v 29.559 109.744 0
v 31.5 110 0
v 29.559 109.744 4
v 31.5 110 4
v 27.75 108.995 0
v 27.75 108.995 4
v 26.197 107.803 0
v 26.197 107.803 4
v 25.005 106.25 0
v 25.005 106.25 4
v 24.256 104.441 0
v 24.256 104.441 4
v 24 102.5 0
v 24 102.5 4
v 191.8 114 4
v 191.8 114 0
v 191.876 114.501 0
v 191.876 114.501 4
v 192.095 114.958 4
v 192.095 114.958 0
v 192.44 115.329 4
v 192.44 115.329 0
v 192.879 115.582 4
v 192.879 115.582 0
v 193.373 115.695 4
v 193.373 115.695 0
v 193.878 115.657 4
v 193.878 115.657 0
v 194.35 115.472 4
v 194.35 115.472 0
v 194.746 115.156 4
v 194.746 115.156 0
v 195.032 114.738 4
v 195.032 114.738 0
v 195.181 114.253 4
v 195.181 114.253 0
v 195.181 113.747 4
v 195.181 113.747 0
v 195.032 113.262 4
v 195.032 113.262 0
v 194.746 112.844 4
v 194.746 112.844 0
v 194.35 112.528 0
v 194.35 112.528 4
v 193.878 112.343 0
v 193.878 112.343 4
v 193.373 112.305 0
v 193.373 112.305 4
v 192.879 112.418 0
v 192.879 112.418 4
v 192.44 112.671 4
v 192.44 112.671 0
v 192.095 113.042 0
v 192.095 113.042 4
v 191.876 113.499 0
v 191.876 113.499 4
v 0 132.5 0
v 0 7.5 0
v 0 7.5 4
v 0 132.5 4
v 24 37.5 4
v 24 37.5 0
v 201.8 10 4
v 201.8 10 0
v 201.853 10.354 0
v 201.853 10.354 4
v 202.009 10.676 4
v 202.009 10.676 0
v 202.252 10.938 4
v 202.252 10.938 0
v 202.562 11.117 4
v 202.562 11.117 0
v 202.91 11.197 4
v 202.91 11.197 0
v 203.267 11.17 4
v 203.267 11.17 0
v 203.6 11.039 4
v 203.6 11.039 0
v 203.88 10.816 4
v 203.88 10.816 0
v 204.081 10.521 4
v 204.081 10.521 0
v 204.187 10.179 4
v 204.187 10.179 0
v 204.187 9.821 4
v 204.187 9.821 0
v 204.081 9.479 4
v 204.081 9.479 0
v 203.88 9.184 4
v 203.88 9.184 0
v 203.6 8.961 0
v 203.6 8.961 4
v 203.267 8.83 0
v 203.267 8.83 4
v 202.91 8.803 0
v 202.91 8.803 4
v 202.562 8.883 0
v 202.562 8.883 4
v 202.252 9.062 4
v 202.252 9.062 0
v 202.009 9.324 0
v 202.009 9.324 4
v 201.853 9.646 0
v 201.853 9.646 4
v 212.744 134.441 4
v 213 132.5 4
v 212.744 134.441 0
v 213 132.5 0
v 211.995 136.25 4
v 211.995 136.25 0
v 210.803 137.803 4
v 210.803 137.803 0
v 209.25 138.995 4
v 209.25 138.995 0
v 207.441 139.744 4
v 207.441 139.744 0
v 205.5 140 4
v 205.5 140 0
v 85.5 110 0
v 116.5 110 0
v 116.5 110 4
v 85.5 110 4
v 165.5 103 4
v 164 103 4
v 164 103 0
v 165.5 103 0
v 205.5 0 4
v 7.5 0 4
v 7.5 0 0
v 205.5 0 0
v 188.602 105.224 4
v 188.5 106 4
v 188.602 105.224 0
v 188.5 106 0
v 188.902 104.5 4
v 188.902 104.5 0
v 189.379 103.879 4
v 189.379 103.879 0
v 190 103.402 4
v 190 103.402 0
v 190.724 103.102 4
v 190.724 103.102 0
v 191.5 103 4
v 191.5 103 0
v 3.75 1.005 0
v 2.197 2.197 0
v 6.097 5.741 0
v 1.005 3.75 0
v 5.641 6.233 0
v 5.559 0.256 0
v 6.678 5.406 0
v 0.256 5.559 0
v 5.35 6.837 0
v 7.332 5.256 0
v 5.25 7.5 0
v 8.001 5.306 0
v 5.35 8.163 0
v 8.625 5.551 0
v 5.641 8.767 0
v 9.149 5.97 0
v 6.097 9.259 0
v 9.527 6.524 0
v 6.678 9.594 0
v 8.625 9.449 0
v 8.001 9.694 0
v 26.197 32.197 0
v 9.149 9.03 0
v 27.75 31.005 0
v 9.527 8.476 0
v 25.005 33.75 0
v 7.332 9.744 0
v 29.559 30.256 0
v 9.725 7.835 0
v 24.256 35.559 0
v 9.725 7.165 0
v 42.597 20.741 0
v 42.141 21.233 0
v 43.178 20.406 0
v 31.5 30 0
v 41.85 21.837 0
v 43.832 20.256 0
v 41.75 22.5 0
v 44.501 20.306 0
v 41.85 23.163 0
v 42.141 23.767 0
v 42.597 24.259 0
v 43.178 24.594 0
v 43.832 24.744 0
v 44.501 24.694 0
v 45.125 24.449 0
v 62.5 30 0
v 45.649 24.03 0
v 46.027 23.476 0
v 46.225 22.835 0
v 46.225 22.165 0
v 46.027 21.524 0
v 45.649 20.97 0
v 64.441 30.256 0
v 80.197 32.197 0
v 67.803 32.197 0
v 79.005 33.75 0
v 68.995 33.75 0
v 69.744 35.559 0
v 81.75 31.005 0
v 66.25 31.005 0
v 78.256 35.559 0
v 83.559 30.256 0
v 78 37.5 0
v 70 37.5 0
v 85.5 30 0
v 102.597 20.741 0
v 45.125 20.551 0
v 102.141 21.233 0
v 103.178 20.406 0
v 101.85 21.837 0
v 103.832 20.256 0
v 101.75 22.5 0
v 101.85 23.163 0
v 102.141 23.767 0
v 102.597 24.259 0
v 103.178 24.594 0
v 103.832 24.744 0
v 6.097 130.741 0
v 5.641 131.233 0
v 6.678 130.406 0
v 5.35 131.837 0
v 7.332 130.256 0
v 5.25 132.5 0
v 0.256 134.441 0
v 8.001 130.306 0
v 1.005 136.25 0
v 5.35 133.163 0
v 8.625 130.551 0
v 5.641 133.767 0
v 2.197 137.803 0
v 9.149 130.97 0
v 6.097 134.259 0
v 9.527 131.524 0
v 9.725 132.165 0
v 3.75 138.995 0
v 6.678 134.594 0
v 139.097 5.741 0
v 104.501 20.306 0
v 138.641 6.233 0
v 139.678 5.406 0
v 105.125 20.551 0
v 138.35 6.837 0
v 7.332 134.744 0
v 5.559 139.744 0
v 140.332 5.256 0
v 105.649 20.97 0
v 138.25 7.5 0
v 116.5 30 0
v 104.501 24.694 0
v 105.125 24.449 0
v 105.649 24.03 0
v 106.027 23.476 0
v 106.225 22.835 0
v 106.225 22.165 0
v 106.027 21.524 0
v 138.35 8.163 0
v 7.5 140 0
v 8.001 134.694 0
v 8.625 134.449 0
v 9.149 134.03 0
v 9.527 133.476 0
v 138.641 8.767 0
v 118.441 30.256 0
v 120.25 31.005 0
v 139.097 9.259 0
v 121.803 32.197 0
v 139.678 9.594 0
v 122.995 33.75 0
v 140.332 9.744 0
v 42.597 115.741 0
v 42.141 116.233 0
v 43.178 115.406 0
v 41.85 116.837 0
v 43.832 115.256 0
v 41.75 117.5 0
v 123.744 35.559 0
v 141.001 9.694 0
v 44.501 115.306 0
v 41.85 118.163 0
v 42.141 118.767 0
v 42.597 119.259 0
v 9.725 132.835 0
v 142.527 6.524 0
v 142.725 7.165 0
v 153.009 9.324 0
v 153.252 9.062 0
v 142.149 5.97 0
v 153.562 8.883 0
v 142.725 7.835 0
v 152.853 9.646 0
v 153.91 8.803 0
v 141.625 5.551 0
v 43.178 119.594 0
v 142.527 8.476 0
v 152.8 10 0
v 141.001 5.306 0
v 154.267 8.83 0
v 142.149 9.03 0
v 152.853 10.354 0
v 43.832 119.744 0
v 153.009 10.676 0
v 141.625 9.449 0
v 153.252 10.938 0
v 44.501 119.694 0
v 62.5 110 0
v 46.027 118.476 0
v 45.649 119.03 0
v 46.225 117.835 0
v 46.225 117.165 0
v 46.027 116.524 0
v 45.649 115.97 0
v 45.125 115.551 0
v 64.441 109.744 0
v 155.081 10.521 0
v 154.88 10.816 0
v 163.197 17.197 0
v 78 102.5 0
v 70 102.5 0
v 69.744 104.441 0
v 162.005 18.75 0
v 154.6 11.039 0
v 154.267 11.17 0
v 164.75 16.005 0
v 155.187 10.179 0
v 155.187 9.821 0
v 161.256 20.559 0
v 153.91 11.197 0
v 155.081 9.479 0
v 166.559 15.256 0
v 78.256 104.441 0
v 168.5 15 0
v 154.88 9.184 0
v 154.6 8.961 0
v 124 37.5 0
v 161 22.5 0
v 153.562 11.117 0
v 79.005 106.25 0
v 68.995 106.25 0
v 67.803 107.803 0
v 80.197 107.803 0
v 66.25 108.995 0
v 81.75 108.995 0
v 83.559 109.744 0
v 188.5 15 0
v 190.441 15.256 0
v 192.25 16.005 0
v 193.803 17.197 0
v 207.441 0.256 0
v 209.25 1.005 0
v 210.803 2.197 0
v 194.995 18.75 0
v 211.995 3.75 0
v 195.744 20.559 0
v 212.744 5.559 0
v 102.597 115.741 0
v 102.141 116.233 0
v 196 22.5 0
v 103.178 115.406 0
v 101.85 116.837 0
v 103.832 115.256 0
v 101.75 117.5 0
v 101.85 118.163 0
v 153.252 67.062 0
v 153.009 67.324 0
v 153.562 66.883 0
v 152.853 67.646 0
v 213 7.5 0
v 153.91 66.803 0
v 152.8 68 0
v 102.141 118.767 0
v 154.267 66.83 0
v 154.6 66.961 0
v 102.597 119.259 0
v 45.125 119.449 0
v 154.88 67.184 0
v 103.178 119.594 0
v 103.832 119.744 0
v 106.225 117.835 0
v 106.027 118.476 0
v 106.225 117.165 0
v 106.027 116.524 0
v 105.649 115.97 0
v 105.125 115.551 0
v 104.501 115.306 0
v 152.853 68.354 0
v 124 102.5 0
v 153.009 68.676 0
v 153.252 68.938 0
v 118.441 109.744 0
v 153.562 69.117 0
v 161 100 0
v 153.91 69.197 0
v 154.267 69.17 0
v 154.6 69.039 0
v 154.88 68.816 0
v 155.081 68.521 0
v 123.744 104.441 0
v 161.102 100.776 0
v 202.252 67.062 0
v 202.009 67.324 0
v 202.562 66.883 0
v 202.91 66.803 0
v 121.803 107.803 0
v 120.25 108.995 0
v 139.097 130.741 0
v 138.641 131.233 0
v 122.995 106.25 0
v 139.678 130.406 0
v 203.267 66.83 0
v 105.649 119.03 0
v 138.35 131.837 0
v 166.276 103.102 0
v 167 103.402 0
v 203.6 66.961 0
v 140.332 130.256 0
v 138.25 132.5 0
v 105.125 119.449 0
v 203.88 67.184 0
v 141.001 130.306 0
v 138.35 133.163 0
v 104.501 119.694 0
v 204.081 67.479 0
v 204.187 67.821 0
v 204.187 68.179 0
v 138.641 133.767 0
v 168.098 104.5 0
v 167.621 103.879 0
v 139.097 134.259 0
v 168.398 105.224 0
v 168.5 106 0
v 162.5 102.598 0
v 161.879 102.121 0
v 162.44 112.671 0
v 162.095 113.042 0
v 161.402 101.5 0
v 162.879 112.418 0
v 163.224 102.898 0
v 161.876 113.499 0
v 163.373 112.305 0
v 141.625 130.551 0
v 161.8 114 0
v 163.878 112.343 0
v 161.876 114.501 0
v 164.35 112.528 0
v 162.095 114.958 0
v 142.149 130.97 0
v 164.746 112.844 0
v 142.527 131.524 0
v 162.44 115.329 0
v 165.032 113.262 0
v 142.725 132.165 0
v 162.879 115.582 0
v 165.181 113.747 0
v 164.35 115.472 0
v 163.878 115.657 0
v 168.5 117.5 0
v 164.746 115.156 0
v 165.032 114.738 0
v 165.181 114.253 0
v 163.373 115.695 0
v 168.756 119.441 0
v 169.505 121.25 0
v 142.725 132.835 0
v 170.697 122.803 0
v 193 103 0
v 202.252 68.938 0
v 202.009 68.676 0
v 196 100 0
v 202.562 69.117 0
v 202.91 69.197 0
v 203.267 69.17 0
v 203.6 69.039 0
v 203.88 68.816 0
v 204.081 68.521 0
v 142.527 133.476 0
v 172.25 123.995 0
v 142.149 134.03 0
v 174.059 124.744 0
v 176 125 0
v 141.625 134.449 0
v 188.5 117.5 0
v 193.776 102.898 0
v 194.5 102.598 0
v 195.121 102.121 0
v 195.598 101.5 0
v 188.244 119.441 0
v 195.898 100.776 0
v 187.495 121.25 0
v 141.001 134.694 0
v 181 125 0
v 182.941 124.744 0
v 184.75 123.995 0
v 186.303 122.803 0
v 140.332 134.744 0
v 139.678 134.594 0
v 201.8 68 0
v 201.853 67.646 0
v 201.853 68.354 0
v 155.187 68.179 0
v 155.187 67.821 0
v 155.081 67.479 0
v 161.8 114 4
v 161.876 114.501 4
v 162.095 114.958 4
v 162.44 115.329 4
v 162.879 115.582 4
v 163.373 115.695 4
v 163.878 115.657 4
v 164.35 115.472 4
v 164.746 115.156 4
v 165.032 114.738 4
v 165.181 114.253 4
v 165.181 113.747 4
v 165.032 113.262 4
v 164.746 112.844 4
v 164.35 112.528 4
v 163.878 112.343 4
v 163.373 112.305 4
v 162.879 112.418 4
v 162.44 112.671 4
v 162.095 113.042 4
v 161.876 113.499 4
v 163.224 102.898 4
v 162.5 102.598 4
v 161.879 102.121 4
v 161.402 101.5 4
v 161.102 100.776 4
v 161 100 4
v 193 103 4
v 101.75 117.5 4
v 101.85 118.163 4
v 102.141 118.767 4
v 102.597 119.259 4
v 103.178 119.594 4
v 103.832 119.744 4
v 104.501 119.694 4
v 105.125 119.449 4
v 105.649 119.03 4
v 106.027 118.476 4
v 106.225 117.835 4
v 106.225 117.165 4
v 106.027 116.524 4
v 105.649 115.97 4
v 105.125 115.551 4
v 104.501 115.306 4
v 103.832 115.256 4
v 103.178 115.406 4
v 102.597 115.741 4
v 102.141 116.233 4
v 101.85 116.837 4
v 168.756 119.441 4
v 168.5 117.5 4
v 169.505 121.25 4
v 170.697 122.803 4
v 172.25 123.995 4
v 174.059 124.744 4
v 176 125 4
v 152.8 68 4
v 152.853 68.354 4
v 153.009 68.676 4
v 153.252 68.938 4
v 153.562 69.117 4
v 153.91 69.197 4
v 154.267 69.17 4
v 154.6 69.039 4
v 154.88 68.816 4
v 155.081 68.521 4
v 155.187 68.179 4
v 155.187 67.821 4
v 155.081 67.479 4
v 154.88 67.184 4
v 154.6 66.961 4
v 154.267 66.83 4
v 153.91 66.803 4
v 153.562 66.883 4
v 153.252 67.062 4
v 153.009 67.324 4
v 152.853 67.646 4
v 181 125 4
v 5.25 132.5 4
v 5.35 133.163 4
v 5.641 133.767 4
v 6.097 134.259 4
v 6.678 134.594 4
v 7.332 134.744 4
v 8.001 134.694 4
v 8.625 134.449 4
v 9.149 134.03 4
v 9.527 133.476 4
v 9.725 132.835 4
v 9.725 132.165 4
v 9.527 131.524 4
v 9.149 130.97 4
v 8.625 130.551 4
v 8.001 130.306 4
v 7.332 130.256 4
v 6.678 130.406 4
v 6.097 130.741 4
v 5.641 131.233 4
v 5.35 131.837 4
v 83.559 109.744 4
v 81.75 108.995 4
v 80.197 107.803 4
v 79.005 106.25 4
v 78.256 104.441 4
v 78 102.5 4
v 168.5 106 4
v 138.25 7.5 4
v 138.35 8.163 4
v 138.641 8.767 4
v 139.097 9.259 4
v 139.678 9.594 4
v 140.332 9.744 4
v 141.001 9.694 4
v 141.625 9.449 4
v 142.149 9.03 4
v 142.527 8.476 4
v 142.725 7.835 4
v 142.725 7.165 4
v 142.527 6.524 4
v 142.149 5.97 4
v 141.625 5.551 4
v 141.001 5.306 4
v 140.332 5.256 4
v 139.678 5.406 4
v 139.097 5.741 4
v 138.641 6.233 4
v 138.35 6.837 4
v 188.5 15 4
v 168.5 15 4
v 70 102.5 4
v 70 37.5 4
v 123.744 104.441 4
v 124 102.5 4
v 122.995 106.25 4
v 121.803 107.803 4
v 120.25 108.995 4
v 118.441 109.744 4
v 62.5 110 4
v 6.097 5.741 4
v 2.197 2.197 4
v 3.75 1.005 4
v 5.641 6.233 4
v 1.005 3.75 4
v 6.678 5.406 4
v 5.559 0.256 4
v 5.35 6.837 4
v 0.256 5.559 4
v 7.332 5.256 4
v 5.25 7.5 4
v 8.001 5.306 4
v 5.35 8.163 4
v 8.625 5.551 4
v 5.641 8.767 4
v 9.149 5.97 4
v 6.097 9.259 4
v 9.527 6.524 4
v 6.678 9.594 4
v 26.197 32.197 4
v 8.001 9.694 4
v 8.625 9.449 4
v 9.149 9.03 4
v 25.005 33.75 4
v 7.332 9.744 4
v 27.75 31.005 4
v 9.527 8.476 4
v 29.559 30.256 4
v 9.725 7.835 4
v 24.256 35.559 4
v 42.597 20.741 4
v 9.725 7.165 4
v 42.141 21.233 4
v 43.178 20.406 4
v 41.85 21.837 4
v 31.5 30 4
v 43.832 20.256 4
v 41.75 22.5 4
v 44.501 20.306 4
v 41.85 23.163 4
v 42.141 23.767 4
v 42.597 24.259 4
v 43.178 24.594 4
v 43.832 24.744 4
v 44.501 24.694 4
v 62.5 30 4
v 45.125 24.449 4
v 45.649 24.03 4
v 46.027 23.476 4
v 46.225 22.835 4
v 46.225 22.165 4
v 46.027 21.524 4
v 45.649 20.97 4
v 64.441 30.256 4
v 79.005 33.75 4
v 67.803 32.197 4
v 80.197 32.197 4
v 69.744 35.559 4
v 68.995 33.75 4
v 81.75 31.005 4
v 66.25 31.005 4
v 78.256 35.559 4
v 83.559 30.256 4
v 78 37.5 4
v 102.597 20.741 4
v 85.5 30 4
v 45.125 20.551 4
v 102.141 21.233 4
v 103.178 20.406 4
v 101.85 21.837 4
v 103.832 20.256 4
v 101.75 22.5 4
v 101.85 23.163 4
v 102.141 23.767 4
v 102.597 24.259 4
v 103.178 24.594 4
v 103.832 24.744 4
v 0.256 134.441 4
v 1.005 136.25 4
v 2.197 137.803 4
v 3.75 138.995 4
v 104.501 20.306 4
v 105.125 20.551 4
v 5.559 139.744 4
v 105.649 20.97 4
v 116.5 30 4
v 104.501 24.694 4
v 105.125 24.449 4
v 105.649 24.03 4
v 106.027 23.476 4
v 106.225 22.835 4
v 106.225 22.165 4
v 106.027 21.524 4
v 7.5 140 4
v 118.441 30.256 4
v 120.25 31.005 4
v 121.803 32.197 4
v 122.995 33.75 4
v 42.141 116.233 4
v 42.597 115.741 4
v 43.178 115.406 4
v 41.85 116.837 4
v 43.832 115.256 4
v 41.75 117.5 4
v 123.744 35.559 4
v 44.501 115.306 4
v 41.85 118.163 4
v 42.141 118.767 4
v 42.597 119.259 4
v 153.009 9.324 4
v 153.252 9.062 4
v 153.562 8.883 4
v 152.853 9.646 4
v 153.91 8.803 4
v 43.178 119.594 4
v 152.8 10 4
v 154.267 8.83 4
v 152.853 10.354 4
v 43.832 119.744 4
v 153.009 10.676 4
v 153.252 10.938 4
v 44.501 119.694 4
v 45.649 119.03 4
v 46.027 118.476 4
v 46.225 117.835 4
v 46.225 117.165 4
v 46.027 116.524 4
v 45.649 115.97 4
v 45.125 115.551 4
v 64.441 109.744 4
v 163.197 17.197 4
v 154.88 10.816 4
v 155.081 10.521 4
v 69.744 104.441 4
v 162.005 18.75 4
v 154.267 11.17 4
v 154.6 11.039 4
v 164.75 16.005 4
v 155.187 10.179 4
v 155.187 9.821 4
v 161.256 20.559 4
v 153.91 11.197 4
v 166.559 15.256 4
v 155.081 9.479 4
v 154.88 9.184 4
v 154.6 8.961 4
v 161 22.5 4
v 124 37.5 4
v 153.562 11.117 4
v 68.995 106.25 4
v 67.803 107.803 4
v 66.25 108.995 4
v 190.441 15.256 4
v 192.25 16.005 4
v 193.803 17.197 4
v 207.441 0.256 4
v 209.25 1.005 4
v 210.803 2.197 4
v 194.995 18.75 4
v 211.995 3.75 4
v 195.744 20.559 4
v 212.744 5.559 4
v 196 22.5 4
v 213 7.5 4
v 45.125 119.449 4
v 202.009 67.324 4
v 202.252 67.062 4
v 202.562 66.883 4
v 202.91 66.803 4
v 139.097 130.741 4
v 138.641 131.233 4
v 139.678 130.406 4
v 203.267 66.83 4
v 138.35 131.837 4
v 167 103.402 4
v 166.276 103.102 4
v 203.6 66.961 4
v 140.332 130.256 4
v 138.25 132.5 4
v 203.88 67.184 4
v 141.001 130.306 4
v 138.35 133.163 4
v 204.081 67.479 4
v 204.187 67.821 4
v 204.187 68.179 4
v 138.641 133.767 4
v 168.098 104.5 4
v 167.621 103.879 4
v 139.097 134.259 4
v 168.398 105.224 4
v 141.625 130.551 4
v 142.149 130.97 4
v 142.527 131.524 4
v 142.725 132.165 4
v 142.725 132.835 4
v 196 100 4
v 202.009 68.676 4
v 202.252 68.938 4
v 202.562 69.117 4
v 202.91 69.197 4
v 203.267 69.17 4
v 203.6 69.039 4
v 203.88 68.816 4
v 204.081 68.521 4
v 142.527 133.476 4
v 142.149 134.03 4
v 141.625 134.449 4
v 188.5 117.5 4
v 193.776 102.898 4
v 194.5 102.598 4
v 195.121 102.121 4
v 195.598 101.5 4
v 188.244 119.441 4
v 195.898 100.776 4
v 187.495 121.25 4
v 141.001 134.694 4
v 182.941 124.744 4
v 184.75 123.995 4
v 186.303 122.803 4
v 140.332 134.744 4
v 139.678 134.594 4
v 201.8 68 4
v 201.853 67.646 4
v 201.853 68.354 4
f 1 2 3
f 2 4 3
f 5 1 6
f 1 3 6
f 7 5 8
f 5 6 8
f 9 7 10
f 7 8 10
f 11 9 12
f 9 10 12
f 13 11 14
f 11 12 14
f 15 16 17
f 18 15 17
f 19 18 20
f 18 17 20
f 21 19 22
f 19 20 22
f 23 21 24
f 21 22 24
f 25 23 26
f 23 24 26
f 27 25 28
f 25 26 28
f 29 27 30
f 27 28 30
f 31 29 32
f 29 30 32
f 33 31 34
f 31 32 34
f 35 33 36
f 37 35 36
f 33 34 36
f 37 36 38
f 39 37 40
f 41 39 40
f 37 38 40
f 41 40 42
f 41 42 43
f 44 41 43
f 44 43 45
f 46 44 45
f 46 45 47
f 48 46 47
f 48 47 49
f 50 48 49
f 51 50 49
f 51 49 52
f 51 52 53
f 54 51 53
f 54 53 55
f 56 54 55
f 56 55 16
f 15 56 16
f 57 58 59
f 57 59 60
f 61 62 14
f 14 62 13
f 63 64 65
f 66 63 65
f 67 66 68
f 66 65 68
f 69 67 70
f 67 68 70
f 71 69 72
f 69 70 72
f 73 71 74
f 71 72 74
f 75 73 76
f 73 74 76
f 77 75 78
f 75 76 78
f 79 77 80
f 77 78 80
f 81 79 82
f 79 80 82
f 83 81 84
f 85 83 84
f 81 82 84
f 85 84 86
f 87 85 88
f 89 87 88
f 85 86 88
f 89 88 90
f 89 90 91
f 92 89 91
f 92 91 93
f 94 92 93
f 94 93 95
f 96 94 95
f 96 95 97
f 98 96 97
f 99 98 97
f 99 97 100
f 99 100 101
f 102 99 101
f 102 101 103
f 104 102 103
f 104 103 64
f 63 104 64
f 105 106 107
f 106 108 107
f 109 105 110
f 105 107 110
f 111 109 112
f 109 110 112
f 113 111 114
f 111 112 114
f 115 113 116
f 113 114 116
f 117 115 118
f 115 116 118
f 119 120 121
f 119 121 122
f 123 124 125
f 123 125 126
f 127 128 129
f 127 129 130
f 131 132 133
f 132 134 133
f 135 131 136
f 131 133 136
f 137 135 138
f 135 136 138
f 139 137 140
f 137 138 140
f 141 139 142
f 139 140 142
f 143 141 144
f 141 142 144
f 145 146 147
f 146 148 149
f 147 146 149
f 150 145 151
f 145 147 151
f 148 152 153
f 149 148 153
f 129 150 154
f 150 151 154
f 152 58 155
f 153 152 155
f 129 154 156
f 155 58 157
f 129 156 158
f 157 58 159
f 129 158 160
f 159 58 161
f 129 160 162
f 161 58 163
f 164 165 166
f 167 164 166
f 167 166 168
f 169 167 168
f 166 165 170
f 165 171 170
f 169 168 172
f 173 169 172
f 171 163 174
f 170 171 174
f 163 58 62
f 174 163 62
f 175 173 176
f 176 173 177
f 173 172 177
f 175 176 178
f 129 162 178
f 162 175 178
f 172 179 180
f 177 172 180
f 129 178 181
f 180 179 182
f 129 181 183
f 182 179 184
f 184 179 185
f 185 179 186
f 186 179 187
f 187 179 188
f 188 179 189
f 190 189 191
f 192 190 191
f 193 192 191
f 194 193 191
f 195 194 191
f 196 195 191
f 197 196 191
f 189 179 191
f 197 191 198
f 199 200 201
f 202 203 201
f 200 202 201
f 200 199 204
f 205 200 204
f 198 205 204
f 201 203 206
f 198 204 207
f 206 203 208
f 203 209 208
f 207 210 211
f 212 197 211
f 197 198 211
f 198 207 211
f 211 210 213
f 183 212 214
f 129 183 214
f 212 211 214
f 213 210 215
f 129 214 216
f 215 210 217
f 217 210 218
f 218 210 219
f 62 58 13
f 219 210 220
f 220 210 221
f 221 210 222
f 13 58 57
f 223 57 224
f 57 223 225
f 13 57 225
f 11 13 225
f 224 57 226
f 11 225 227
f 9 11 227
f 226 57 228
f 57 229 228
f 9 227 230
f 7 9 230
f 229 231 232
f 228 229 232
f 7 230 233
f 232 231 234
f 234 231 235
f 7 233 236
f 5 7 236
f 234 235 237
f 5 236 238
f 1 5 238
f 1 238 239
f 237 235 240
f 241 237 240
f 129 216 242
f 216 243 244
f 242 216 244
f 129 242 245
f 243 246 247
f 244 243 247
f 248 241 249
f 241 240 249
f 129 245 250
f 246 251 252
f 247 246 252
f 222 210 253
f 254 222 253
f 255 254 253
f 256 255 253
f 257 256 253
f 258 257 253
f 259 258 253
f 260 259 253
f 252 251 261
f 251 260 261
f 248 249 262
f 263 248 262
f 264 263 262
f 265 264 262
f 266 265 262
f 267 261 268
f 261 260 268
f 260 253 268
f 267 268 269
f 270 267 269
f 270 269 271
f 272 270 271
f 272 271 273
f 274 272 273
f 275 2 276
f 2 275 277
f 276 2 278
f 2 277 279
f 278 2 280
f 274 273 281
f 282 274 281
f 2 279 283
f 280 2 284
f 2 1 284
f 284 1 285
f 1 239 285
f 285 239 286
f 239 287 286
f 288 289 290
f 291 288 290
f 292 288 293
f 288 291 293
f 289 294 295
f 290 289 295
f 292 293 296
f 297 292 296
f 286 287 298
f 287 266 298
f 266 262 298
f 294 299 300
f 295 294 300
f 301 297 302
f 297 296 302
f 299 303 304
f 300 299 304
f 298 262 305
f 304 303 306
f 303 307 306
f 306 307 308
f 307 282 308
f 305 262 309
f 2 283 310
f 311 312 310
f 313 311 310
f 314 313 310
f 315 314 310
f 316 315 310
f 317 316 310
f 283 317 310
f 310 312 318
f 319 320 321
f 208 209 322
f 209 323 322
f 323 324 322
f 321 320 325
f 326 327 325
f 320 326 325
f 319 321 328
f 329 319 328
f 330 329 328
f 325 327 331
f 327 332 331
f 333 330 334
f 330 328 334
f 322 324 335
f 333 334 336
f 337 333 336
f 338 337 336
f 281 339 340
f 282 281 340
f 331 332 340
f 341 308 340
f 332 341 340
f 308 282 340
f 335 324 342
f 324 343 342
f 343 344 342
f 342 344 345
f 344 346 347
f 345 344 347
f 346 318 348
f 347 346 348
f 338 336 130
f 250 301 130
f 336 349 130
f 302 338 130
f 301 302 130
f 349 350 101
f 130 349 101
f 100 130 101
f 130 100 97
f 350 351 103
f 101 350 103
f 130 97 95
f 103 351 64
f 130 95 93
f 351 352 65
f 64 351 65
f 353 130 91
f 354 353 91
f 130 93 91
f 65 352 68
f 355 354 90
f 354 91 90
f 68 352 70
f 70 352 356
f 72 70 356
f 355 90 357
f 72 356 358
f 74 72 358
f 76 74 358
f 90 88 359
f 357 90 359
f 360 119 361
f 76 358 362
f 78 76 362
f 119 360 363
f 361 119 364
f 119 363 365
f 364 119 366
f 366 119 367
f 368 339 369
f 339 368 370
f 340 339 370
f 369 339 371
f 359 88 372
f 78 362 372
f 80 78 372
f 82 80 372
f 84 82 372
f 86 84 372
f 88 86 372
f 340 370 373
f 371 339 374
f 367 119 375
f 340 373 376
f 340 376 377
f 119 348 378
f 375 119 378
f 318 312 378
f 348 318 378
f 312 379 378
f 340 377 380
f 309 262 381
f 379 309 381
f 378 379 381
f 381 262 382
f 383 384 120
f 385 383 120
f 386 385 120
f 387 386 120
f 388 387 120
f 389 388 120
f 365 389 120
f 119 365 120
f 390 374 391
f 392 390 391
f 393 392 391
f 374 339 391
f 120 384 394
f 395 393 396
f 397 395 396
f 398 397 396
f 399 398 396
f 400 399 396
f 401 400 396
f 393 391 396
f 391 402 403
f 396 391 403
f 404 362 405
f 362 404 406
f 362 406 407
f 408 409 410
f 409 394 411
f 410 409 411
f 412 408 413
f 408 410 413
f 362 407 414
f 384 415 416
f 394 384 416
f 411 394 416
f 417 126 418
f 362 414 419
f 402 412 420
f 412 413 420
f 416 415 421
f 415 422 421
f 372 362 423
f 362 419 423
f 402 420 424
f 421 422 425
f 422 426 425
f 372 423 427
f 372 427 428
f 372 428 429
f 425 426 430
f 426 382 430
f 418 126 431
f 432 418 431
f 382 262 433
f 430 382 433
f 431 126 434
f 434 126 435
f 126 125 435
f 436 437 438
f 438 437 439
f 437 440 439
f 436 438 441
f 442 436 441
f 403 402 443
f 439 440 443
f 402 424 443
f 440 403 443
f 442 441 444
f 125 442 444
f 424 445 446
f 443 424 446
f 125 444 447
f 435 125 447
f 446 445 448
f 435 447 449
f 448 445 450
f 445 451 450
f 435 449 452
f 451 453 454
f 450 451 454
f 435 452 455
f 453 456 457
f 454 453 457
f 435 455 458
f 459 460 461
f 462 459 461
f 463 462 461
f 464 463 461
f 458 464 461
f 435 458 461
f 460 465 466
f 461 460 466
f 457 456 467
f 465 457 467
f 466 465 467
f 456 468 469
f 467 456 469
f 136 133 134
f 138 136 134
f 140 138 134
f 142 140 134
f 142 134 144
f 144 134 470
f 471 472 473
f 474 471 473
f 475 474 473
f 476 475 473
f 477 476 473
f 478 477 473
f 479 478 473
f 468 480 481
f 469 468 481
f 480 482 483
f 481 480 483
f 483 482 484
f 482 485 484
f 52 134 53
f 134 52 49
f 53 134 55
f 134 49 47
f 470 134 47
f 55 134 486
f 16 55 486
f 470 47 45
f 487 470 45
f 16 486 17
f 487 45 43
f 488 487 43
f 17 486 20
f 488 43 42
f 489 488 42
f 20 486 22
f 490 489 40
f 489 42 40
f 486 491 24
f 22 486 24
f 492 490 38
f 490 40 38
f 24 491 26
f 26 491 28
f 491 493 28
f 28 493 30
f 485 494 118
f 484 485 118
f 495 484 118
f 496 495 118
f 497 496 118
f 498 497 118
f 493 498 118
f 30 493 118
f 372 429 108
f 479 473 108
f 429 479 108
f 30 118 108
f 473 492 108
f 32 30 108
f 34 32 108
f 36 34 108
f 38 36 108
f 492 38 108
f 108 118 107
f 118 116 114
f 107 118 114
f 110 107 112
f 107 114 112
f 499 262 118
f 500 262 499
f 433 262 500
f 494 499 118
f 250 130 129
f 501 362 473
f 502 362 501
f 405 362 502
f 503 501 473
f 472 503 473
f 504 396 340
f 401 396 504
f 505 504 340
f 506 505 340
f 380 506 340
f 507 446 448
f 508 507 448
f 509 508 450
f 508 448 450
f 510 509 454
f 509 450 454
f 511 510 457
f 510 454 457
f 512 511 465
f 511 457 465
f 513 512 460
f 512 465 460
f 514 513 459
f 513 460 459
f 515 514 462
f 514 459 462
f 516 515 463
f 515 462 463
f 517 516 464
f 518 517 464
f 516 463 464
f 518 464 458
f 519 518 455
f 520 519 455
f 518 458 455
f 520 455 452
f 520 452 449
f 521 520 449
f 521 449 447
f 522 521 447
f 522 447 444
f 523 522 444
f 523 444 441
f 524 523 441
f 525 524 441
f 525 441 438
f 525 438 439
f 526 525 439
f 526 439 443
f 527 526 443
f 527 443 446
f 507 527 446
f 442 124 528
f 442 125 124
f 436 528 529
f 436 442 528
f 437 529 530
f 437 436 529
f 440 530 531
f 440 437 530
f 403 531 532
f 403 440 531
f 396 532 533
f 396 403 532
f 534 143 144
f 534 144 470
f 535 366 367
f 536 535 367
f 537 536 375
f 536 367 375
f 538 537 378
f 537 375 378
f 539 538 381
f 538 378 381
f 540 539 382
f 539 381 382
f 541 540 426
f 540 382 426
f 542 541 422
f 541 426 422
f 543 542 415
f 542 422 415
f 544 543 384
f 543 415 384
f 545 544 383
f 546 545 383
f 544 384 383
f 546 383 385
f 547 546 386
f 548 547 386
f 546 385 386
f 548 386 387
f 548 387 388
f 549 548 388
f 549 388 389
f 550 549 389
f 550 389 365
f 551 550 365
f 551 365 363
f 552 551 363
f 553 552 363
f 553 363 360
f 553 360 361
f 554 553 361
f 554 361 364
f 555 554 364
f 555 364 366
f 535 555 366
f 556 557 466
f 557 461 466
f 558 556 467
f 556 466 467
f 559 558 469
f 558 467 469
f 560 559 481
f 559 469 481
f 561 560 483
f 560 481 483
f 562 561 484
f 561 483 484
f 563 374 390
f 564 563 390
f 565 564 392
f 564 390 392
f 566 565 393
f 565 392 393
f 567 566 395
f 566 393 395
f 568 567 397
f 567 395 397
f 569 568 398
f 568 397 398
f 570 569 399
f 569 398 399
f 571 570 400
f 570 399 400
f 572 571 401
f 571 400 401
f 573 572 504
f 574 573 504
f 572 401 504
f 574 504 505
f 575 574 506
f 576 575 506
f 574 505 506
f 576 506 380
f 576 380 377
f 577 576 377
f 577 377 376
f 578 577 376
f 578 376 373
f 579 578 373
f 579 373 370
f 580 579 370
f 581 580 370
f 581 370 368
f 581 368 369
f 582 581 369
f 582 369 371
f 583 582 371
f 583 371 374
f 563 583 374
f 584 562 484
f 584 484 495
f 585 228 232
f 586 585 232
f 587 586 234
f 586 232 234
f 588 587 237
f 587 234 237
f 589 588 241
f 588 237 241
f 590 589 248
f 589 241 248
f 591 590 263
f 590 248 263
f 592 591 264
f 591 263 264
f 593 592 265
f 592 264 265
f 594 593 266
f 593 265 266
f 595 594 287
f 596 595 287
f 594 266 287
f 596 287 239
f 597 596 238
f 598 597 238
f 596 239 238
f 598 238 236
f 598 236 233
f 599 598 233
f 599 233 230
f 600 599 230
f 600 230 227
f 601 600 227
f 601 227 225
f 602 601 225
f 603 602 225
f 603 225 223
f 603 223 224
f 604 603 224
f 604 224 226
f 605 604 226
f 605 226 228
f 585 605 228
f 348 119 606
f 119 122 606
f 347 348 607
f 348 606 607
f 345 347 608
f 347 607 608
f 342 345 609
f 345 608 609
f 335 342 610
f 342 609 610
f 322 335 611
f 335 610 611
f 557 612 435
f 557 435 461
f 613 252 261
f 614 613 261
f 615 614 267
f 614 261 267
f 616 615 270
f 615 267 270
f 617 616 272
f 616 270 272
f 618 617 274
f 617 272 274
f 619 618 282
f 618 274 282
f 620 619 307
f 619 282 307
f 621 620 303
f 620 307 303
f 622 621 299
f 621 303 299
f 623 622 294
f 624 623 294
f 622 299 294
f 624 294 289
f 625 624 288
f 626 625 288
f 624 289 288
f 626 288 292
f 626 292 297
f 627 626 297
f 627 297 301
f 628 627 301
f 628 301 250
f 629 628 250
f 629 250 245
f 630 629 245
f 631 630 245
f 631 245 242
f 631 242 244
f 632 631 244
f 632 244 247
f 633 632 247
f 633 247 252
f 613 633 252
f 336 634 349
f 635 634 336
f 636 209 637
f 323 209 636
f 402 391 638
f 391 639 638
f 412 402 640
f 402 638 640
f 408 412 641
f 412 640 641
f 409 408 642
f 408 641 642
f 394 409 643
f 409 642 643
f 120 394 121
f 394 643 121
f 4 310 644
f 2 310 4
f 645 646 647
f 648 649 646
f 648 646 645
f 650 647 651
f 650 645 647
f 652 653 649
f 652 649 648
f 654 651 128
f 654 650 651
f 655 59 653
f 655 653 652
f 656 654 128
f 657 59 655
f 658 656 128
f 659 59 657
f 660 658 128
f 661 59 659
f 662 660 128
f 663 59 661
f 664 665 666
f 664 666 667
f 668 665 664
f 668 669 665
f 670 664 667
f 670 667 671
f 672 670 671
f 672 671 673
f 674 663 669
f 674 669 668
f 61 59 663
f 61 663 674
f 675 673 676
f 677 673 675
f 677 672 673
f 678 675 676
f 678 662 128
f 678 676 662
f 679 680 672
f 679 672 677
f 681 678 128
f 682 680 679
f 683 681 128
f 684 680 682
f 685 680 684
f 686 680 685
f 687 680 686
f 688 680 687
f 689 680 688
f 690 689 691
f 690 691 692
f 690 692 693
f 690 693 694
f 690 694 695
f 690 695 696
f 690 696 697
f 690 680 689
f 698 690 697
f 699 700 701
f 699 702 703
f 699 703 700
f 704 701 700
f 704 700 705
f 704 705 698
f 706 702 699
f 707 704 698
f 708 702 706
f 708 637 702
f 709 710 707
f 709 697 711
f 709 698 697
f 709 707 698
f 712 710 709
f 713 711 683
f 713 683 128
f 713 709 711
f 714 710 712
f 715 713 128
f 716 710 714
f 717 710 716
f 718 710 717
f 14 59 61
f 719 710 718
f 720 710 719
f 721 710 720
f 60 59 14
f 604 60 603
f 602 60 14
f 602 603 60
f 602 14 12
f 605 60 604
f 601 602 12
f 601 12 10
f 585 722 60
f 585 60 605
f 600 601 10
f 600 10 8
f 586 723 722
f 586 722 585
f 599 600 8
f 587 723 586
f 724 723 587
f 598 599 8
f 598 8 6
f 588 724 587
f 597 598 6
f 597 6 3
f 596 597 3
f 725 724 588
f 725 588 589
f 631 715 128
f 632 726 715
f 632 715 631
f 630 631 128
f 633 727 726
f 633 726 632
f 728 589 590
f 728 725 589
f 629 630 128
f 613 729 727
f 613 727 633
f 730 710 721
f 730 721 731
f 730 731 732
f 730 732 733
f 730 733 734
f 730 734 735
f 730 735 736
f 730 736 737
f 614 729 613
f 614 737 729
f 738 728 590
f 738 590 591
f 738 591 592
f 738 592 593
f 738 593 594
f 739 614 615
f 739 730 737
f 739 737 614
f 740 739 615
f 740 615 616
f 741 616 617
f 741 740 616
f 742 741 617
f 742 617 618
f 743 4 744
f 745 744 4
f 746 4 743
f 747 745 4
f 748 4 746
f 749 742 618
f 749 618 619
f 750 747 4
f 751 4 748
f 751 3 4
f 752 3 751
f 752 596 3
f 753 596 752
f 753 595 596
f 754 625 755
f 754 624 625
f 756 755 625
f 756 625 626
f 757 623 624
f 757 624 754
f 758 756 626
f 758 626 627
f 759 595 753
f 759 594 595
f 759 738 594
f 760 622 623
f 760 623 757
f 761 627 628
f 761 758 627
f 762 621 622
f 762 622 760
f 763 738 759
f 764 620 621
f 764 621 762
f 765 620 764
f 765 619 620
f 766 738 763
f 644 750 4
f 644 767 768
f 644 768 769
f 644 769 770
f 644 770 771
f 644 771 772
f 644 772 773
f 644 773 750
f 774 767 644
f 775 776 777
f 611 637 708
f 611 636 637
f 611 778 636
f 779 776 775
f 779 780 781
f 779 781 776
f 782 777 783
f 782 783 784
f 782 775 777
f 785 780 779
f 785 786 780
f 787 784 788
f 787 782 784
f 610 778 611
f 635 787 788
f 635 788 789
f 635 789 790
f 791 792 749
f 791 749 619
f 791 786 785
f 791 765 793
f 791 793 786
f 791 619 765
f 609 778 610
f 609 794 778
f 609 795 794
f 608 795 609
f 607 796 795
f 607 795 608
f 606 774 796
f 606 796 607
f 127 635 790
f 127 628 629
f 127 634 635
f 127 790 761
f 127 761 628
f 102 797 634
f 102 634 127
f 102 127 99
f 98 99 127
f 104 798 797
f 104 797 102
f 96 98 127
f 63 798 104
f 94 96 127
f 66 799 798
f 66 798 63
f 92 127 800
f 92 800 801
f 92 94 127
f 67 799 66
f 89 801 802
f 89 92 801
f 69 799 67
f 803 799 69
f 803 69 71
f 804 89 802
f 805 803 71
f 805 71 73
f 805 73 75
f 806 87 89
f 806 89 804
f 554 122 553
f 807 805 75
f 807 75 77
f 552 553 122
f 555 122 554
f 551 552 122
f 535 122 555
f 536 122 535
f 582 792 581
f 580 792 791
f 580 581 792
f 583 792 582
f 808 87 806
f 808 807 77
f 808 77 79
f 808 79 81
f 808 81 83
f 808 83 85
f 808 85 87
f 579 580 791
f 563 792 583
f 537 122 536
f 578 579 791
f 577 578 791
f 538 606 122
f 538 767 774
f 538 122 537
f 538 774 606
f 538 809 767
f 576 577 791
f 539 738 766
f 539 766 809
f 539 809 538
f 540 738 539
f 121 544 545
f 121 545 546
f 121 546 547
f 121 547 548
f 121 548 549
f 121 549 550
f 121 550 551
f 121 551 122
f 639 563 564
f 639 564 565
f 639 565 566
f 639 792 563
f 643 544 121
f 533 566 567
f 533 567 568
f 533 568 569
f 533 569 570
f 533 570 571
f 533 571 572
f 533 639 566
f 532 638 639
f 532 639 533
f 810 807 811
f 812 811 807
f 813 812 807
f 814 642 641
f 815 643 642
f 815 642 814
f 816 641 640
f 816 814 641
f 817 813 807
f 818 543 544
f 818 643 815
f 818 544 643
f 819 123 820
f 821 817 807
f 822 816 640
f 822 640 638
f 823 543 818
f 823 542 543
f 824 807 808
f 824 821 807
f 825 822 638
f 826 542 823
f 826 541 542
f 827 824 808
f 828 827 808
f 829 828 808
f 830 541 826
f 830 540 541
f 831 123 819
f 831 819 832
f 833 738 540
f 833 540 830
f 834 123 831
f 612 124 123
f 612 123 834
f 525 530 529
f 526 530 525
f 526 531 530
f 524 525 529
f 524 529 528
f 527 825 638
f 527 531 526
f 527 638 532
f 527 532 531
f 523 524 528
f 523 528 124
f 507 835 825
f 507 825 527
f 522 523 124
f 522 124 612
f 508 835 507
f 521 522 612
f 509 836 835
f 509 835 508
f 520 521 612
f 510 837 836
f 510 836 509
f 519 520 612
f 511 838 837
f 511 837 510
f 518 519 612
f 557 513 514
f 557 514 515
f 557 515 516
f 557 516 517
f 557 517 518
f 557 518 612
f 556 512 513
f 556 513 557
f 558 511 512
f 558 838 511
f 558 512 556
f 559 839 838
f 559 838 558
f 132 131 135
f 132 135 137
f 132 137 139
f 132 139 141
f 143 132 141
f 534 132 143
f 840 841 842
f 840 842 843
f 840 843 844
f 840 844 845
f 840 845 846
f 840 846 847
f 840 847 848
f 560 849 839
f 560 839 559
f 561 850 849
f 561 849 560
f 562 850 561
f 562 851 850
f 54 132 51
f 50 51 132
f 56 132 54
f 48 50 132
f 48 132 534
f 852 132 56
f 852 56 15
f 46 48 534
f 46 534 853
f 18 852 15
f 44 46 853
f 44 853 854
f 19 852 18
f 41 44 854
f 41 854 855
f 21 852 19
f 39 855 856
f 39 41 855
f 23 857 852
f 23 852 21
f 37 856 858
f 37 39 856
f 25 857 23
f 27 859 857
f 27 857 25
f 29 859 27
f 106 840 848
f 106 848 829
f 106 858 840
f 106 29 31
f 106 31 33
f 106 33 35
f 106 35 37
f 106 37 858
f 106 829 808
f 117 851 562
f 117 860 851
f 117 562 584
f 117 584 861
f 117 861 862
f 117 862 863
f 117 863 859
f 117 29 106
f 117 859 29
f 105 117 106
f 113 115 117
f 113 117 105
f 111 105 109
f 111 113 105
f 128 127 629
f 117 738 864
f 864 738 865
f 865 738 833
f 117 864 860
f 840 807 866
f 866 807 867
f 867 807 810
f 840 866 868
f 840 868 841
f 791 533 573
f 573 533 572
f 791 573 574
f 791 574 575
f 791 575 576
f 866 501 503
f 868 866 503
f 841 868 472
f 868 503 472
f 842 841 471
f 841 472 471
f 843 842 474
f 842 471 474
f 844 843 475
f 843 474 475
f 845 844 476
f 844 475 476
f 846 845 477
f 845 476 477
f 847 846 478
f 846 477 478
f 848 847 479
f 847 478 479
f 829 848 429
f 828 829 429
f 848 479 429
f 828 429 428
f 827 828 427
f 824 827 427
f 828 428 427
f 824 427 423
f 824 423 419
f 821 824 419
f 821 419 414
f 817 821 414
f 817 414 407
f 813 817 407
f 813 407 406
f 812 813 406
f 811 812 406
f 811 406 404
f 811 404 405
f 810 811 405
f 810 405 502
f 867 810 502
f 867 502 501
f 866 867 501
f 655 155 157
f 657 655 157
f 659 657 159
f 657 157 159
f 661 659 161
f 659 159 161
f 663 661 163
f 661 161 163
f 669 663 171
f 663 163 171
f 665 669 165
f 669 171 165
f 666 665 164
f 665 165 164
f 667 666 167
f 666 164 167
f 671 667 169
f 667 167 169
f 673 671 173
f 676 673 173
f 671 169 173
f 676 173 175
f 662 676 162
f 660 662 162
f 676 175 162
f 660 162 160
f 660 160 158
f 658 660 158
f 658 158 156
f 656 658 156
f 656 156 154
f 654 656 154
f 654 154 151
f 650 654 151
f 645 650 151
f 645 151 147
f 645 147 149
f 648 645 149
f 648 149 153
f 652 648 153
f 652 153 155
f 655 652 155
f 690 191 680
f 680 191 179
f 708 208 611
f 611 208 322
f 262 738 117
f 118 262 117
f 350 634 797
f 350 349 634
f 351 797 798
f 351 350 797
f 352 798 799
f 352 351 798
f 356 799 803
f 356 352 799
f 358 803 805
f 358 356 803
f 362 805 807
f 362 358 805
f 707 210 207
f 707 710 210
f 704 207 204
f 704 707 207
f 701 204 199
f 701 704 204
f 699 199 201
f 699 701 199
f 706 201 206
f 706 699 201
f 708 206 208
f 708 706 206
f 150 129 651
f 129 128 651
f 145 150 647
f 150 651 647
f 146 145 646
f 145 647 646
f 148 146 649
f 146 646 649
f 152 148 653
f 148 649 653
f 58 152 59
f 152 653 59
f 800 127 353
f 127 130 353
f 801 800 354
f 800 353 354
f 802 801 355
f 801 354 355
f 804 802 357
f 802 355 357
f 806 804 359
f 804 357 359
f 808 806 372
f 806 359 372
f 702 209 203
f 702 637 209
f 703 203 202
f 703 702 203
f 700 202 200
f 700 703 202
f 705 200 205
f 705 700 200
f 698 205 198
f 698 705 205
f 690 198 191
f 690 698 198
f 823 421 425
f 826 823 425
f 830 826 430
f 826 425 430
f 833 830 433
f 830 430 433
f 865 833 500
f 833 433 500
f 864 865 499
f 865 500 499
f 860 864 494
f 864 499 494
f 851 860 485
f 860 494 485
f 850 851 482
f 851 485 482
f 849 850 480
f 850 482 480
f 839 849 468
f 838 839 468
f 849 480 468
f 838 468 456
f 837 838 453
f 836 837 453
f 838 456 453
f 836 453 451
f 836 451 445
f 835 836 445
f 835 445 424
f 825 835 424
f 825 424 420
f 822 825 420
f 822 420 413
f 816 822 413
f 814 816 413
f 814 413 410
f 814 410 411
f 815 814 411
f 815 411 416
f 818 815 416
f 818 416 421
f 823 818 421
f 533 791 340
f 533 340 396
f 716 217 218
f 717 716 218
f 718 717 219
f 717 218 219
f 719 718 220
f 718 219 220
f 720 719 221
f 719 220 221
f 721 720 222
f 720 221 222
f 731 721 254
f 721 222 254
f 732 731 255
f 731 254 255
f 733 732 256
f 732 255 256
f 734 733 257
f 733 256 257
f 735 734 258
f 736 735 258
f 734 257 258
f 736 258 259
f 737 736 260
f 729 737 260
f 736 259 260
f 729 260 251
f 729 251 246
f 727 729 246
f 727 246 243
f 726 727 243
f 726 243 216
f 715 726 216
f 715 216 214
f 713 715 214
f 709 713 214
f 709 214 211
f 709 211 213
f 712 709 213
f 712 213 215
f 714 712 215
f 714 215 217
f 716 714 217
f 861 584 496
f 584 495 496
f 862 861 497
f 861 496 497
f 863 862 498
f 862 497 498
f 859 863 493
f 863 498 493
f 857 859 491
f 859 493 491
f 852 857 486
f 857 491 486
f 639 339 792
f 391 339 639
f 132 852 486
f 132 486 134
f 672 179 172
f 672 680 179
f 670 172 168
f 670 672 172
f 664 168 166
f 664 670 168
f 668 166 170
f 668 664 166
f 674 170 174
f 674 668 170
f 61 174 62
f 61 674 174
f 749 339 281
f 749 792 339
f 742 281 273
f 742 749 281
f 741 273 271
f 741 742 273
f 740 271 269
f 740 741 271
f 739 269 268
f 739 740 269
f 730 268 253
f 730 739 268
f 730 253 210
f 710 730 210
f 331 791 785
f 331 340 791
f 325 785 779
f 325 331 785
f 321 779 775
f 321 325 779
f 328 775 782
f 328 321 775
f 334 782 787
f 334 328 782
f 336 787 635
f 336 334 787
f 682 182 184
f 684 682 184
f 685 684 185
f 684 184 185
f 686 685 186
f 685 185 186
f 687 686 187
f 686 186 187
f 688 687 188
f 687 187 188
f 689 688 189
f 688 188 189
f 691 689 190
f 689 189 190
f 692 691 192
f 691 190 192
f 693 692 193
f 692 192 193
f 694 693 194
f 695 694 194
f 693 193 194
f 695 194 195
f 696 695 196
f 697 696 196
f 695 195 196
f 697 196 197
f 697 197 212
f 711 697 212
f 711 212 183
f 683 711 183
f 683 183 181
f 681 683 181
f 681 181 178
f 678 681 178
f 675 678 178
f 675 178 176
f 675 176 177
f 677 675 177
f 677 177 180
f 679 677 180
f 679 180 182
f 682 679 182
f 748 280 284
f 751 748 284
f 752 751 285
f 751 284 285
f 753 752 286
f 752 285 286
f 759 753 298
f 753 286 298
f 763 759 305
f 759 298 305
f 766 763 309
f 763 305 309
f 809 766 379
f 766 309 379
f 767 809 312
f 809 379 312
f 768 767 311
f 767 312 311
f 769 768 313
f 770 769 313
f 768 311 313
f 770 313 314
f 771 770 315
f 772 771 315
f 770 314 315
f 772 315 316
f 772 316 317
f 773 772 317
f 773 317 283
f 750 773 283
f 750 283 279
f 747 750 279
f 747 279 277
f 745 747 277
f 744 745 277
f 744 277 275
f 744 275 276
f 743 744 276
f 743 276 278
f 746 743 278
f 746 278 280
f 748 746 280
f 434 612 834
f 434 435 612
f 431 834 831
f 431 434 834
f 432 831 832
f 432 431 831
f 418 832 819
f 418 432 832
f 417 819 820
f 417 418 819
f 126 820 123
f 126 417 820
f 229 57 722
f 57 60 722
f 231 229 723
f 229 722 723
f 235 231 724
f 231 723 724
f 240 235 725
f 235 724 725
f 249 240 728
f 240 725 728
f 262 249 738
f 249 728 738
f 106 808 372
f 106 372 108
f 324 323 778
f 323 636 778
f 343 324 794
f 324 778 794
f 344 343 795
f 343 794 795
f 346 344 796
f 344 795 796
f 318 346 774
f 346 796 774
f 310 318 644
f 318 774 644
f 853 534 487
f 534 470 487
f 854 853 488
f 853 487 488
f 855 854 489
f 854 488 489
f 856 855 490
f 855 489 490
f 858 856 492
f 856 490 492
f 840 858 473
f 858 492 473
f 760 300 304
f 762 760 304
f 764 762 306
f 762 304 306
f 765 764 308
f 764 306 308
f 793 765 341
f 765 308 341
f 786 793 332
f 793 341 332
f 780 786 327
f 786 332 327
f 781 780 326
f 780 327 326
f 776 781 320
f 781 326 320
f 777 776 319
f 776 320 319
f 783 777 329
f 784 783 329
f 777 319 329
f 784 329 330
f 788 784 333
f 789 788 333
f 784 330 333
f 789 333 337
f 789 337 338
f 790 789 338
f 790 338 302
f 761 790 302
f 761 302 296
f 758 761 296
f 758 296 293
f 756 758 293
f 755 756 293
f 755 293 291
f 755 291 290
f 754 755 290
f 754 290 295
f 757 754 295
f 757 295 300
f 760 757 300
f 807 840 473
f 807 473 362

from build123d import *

# Parameters (mm, degrees)
SKETCH_1_W              = 140
SKETCH_1_H              = 148
SKETCH_1_W_2            = 80
SKETCH_1_H_2            = 46
EXTRUDE_1_DEPTH         = 4
HOLE_WIZARD_M4_1_D      = 4.5
HOLE_WIZARD_4_5_4_5_1_D = 4.5
SKETCH_9_W              = 65
SKETCH_9_H              = 140
EXTRUDE_3_DEPTH         = 4
HOLE_WIZARD_M2_1_D      = 2.4
CUT_EXTRUDE_1_DEPTH     = 255.921556562
HOLE_WIZARD_M3_1_D      = 3.4
FILLET_6_R              = 7.5
FILLET_8_R              = 3


with BuildPart() as part:
    # ｽｹｯﾁ1 → ﾎﾞｽ - 押し出し1 (new body)
    with BuildSketch(Plane(origin=(0, 0, 0), x_dir=(0, 1, 0), z_dir=(0, 0, 1))):
        with Locations((70, -74)):
            Rectangle(SKETCH_1_W, SKETCH_1_H)
        with Locations((70, -47)):
            Rectangle(SKETCH_1_W_2, SKETCH_1_H_2, mode=Mode.SUBTRACT)
        with Locations((70, -101)):
            Rectangle(SKETCH_1_W_2, SKETCH_1_H_2, mode=Mode.SUBTRACT)
    extrude(amount=EXTRUDE_1_DEPTH)

    # M4 すきま穴1 (through all)
    with Locations(Plane.XY.offset(4)):
        with Locations((7.5, 132.5), (140.5, 132.5), (7.5, 7.5), (140.5, 7.5)):
            Hole(HOLE_WIZARD_M4_1_D / 2)

    # Ø4.5 (4.5) 直径の穴1 (through all)
    with Locations(Plane.XY.offset(4)):
        with Locations((44, 117.5), (104, 117.5), (104, 22.5), (44, 22.5)):
            Hole(HOLE_WIZARD_4_5_4_5_1_D / 2)

    # ｽｹｯﾁ9 → ﾎﾞｽ - 押し出し3 (add)
    with BuildSketch(Plane.XY.offset(4)):
        with Locations((180.5, 70)):
            Rectangle(SKETCH_9_W, SKETCH_9_H)
    extrude(amount=-EXTRUDE_3_DEPTH)

    # M2 すきま穴1 (through all)
    with Locations(Plane.XY.offset(4)):
        with Locations((203, 10), (154, 68), (203, 68), (154, 10)):
            Hole(HOLE_WIZARD_M2_1_D / 2)

    # ｽｹｯﾁ13 → ｶｯﾄ - 押し出し1 (cut, through all)
    with BuildSketch(Plane.XY.offset(4)):
        Polygon((168.5, 125), (188.5, 125), (188.5, 103), (196, 103), (196, 15), (161, 15), (161, 103), (168.5, 103), align=None)
    extrude(amount=-CUT_EXTRUDE_1_DEPTH, mode=Mode.SUBTRACT)

    # M3 すきま穴1 (through all)
    with Locations(Plane.XY.offset(4)):
        with Locations((163.5, 114), (193.5, 114)):
            Hole(HOLE_WIZARD_M3_1_D / 2)

    # ﾌｨﾚｯﾄ6
    fillet_6_edges = [part.edges().sort_by_distance(p)[0] for p in [
        (168.5, 125, 2),
        (188.5, 125, 2),
        (196, 15, 2),
        (161, 15, 2),
        (24, 30, 2),
        (70, 30, 2),
        (70, 110, 2),
        (24, 110, 2),
        (124, 110, 2),
        (78, 110, 2),
        (78, 30, 2),
        (124, 30, 2),
        (0, 0, 2),
        (0, 140, 2),
        (213, 140, 2),
        (213, 0, 2),
    ]]
    fillet(fillet_6_edges, radius=FILLET_6_R)

    # ﾌｨﾚｯﾄ8
    fillet_8_edges = [part.edges().sort_by_distance(p)[0] for p in [
        (168.5, 103, 2),
        (188.5, 103, 2),
        (196, 103, 2),
        (161, 103, 2),
    ]]
    fillet(fillet_8_edges, radius=FILLET_8_R)


solid = part.part
